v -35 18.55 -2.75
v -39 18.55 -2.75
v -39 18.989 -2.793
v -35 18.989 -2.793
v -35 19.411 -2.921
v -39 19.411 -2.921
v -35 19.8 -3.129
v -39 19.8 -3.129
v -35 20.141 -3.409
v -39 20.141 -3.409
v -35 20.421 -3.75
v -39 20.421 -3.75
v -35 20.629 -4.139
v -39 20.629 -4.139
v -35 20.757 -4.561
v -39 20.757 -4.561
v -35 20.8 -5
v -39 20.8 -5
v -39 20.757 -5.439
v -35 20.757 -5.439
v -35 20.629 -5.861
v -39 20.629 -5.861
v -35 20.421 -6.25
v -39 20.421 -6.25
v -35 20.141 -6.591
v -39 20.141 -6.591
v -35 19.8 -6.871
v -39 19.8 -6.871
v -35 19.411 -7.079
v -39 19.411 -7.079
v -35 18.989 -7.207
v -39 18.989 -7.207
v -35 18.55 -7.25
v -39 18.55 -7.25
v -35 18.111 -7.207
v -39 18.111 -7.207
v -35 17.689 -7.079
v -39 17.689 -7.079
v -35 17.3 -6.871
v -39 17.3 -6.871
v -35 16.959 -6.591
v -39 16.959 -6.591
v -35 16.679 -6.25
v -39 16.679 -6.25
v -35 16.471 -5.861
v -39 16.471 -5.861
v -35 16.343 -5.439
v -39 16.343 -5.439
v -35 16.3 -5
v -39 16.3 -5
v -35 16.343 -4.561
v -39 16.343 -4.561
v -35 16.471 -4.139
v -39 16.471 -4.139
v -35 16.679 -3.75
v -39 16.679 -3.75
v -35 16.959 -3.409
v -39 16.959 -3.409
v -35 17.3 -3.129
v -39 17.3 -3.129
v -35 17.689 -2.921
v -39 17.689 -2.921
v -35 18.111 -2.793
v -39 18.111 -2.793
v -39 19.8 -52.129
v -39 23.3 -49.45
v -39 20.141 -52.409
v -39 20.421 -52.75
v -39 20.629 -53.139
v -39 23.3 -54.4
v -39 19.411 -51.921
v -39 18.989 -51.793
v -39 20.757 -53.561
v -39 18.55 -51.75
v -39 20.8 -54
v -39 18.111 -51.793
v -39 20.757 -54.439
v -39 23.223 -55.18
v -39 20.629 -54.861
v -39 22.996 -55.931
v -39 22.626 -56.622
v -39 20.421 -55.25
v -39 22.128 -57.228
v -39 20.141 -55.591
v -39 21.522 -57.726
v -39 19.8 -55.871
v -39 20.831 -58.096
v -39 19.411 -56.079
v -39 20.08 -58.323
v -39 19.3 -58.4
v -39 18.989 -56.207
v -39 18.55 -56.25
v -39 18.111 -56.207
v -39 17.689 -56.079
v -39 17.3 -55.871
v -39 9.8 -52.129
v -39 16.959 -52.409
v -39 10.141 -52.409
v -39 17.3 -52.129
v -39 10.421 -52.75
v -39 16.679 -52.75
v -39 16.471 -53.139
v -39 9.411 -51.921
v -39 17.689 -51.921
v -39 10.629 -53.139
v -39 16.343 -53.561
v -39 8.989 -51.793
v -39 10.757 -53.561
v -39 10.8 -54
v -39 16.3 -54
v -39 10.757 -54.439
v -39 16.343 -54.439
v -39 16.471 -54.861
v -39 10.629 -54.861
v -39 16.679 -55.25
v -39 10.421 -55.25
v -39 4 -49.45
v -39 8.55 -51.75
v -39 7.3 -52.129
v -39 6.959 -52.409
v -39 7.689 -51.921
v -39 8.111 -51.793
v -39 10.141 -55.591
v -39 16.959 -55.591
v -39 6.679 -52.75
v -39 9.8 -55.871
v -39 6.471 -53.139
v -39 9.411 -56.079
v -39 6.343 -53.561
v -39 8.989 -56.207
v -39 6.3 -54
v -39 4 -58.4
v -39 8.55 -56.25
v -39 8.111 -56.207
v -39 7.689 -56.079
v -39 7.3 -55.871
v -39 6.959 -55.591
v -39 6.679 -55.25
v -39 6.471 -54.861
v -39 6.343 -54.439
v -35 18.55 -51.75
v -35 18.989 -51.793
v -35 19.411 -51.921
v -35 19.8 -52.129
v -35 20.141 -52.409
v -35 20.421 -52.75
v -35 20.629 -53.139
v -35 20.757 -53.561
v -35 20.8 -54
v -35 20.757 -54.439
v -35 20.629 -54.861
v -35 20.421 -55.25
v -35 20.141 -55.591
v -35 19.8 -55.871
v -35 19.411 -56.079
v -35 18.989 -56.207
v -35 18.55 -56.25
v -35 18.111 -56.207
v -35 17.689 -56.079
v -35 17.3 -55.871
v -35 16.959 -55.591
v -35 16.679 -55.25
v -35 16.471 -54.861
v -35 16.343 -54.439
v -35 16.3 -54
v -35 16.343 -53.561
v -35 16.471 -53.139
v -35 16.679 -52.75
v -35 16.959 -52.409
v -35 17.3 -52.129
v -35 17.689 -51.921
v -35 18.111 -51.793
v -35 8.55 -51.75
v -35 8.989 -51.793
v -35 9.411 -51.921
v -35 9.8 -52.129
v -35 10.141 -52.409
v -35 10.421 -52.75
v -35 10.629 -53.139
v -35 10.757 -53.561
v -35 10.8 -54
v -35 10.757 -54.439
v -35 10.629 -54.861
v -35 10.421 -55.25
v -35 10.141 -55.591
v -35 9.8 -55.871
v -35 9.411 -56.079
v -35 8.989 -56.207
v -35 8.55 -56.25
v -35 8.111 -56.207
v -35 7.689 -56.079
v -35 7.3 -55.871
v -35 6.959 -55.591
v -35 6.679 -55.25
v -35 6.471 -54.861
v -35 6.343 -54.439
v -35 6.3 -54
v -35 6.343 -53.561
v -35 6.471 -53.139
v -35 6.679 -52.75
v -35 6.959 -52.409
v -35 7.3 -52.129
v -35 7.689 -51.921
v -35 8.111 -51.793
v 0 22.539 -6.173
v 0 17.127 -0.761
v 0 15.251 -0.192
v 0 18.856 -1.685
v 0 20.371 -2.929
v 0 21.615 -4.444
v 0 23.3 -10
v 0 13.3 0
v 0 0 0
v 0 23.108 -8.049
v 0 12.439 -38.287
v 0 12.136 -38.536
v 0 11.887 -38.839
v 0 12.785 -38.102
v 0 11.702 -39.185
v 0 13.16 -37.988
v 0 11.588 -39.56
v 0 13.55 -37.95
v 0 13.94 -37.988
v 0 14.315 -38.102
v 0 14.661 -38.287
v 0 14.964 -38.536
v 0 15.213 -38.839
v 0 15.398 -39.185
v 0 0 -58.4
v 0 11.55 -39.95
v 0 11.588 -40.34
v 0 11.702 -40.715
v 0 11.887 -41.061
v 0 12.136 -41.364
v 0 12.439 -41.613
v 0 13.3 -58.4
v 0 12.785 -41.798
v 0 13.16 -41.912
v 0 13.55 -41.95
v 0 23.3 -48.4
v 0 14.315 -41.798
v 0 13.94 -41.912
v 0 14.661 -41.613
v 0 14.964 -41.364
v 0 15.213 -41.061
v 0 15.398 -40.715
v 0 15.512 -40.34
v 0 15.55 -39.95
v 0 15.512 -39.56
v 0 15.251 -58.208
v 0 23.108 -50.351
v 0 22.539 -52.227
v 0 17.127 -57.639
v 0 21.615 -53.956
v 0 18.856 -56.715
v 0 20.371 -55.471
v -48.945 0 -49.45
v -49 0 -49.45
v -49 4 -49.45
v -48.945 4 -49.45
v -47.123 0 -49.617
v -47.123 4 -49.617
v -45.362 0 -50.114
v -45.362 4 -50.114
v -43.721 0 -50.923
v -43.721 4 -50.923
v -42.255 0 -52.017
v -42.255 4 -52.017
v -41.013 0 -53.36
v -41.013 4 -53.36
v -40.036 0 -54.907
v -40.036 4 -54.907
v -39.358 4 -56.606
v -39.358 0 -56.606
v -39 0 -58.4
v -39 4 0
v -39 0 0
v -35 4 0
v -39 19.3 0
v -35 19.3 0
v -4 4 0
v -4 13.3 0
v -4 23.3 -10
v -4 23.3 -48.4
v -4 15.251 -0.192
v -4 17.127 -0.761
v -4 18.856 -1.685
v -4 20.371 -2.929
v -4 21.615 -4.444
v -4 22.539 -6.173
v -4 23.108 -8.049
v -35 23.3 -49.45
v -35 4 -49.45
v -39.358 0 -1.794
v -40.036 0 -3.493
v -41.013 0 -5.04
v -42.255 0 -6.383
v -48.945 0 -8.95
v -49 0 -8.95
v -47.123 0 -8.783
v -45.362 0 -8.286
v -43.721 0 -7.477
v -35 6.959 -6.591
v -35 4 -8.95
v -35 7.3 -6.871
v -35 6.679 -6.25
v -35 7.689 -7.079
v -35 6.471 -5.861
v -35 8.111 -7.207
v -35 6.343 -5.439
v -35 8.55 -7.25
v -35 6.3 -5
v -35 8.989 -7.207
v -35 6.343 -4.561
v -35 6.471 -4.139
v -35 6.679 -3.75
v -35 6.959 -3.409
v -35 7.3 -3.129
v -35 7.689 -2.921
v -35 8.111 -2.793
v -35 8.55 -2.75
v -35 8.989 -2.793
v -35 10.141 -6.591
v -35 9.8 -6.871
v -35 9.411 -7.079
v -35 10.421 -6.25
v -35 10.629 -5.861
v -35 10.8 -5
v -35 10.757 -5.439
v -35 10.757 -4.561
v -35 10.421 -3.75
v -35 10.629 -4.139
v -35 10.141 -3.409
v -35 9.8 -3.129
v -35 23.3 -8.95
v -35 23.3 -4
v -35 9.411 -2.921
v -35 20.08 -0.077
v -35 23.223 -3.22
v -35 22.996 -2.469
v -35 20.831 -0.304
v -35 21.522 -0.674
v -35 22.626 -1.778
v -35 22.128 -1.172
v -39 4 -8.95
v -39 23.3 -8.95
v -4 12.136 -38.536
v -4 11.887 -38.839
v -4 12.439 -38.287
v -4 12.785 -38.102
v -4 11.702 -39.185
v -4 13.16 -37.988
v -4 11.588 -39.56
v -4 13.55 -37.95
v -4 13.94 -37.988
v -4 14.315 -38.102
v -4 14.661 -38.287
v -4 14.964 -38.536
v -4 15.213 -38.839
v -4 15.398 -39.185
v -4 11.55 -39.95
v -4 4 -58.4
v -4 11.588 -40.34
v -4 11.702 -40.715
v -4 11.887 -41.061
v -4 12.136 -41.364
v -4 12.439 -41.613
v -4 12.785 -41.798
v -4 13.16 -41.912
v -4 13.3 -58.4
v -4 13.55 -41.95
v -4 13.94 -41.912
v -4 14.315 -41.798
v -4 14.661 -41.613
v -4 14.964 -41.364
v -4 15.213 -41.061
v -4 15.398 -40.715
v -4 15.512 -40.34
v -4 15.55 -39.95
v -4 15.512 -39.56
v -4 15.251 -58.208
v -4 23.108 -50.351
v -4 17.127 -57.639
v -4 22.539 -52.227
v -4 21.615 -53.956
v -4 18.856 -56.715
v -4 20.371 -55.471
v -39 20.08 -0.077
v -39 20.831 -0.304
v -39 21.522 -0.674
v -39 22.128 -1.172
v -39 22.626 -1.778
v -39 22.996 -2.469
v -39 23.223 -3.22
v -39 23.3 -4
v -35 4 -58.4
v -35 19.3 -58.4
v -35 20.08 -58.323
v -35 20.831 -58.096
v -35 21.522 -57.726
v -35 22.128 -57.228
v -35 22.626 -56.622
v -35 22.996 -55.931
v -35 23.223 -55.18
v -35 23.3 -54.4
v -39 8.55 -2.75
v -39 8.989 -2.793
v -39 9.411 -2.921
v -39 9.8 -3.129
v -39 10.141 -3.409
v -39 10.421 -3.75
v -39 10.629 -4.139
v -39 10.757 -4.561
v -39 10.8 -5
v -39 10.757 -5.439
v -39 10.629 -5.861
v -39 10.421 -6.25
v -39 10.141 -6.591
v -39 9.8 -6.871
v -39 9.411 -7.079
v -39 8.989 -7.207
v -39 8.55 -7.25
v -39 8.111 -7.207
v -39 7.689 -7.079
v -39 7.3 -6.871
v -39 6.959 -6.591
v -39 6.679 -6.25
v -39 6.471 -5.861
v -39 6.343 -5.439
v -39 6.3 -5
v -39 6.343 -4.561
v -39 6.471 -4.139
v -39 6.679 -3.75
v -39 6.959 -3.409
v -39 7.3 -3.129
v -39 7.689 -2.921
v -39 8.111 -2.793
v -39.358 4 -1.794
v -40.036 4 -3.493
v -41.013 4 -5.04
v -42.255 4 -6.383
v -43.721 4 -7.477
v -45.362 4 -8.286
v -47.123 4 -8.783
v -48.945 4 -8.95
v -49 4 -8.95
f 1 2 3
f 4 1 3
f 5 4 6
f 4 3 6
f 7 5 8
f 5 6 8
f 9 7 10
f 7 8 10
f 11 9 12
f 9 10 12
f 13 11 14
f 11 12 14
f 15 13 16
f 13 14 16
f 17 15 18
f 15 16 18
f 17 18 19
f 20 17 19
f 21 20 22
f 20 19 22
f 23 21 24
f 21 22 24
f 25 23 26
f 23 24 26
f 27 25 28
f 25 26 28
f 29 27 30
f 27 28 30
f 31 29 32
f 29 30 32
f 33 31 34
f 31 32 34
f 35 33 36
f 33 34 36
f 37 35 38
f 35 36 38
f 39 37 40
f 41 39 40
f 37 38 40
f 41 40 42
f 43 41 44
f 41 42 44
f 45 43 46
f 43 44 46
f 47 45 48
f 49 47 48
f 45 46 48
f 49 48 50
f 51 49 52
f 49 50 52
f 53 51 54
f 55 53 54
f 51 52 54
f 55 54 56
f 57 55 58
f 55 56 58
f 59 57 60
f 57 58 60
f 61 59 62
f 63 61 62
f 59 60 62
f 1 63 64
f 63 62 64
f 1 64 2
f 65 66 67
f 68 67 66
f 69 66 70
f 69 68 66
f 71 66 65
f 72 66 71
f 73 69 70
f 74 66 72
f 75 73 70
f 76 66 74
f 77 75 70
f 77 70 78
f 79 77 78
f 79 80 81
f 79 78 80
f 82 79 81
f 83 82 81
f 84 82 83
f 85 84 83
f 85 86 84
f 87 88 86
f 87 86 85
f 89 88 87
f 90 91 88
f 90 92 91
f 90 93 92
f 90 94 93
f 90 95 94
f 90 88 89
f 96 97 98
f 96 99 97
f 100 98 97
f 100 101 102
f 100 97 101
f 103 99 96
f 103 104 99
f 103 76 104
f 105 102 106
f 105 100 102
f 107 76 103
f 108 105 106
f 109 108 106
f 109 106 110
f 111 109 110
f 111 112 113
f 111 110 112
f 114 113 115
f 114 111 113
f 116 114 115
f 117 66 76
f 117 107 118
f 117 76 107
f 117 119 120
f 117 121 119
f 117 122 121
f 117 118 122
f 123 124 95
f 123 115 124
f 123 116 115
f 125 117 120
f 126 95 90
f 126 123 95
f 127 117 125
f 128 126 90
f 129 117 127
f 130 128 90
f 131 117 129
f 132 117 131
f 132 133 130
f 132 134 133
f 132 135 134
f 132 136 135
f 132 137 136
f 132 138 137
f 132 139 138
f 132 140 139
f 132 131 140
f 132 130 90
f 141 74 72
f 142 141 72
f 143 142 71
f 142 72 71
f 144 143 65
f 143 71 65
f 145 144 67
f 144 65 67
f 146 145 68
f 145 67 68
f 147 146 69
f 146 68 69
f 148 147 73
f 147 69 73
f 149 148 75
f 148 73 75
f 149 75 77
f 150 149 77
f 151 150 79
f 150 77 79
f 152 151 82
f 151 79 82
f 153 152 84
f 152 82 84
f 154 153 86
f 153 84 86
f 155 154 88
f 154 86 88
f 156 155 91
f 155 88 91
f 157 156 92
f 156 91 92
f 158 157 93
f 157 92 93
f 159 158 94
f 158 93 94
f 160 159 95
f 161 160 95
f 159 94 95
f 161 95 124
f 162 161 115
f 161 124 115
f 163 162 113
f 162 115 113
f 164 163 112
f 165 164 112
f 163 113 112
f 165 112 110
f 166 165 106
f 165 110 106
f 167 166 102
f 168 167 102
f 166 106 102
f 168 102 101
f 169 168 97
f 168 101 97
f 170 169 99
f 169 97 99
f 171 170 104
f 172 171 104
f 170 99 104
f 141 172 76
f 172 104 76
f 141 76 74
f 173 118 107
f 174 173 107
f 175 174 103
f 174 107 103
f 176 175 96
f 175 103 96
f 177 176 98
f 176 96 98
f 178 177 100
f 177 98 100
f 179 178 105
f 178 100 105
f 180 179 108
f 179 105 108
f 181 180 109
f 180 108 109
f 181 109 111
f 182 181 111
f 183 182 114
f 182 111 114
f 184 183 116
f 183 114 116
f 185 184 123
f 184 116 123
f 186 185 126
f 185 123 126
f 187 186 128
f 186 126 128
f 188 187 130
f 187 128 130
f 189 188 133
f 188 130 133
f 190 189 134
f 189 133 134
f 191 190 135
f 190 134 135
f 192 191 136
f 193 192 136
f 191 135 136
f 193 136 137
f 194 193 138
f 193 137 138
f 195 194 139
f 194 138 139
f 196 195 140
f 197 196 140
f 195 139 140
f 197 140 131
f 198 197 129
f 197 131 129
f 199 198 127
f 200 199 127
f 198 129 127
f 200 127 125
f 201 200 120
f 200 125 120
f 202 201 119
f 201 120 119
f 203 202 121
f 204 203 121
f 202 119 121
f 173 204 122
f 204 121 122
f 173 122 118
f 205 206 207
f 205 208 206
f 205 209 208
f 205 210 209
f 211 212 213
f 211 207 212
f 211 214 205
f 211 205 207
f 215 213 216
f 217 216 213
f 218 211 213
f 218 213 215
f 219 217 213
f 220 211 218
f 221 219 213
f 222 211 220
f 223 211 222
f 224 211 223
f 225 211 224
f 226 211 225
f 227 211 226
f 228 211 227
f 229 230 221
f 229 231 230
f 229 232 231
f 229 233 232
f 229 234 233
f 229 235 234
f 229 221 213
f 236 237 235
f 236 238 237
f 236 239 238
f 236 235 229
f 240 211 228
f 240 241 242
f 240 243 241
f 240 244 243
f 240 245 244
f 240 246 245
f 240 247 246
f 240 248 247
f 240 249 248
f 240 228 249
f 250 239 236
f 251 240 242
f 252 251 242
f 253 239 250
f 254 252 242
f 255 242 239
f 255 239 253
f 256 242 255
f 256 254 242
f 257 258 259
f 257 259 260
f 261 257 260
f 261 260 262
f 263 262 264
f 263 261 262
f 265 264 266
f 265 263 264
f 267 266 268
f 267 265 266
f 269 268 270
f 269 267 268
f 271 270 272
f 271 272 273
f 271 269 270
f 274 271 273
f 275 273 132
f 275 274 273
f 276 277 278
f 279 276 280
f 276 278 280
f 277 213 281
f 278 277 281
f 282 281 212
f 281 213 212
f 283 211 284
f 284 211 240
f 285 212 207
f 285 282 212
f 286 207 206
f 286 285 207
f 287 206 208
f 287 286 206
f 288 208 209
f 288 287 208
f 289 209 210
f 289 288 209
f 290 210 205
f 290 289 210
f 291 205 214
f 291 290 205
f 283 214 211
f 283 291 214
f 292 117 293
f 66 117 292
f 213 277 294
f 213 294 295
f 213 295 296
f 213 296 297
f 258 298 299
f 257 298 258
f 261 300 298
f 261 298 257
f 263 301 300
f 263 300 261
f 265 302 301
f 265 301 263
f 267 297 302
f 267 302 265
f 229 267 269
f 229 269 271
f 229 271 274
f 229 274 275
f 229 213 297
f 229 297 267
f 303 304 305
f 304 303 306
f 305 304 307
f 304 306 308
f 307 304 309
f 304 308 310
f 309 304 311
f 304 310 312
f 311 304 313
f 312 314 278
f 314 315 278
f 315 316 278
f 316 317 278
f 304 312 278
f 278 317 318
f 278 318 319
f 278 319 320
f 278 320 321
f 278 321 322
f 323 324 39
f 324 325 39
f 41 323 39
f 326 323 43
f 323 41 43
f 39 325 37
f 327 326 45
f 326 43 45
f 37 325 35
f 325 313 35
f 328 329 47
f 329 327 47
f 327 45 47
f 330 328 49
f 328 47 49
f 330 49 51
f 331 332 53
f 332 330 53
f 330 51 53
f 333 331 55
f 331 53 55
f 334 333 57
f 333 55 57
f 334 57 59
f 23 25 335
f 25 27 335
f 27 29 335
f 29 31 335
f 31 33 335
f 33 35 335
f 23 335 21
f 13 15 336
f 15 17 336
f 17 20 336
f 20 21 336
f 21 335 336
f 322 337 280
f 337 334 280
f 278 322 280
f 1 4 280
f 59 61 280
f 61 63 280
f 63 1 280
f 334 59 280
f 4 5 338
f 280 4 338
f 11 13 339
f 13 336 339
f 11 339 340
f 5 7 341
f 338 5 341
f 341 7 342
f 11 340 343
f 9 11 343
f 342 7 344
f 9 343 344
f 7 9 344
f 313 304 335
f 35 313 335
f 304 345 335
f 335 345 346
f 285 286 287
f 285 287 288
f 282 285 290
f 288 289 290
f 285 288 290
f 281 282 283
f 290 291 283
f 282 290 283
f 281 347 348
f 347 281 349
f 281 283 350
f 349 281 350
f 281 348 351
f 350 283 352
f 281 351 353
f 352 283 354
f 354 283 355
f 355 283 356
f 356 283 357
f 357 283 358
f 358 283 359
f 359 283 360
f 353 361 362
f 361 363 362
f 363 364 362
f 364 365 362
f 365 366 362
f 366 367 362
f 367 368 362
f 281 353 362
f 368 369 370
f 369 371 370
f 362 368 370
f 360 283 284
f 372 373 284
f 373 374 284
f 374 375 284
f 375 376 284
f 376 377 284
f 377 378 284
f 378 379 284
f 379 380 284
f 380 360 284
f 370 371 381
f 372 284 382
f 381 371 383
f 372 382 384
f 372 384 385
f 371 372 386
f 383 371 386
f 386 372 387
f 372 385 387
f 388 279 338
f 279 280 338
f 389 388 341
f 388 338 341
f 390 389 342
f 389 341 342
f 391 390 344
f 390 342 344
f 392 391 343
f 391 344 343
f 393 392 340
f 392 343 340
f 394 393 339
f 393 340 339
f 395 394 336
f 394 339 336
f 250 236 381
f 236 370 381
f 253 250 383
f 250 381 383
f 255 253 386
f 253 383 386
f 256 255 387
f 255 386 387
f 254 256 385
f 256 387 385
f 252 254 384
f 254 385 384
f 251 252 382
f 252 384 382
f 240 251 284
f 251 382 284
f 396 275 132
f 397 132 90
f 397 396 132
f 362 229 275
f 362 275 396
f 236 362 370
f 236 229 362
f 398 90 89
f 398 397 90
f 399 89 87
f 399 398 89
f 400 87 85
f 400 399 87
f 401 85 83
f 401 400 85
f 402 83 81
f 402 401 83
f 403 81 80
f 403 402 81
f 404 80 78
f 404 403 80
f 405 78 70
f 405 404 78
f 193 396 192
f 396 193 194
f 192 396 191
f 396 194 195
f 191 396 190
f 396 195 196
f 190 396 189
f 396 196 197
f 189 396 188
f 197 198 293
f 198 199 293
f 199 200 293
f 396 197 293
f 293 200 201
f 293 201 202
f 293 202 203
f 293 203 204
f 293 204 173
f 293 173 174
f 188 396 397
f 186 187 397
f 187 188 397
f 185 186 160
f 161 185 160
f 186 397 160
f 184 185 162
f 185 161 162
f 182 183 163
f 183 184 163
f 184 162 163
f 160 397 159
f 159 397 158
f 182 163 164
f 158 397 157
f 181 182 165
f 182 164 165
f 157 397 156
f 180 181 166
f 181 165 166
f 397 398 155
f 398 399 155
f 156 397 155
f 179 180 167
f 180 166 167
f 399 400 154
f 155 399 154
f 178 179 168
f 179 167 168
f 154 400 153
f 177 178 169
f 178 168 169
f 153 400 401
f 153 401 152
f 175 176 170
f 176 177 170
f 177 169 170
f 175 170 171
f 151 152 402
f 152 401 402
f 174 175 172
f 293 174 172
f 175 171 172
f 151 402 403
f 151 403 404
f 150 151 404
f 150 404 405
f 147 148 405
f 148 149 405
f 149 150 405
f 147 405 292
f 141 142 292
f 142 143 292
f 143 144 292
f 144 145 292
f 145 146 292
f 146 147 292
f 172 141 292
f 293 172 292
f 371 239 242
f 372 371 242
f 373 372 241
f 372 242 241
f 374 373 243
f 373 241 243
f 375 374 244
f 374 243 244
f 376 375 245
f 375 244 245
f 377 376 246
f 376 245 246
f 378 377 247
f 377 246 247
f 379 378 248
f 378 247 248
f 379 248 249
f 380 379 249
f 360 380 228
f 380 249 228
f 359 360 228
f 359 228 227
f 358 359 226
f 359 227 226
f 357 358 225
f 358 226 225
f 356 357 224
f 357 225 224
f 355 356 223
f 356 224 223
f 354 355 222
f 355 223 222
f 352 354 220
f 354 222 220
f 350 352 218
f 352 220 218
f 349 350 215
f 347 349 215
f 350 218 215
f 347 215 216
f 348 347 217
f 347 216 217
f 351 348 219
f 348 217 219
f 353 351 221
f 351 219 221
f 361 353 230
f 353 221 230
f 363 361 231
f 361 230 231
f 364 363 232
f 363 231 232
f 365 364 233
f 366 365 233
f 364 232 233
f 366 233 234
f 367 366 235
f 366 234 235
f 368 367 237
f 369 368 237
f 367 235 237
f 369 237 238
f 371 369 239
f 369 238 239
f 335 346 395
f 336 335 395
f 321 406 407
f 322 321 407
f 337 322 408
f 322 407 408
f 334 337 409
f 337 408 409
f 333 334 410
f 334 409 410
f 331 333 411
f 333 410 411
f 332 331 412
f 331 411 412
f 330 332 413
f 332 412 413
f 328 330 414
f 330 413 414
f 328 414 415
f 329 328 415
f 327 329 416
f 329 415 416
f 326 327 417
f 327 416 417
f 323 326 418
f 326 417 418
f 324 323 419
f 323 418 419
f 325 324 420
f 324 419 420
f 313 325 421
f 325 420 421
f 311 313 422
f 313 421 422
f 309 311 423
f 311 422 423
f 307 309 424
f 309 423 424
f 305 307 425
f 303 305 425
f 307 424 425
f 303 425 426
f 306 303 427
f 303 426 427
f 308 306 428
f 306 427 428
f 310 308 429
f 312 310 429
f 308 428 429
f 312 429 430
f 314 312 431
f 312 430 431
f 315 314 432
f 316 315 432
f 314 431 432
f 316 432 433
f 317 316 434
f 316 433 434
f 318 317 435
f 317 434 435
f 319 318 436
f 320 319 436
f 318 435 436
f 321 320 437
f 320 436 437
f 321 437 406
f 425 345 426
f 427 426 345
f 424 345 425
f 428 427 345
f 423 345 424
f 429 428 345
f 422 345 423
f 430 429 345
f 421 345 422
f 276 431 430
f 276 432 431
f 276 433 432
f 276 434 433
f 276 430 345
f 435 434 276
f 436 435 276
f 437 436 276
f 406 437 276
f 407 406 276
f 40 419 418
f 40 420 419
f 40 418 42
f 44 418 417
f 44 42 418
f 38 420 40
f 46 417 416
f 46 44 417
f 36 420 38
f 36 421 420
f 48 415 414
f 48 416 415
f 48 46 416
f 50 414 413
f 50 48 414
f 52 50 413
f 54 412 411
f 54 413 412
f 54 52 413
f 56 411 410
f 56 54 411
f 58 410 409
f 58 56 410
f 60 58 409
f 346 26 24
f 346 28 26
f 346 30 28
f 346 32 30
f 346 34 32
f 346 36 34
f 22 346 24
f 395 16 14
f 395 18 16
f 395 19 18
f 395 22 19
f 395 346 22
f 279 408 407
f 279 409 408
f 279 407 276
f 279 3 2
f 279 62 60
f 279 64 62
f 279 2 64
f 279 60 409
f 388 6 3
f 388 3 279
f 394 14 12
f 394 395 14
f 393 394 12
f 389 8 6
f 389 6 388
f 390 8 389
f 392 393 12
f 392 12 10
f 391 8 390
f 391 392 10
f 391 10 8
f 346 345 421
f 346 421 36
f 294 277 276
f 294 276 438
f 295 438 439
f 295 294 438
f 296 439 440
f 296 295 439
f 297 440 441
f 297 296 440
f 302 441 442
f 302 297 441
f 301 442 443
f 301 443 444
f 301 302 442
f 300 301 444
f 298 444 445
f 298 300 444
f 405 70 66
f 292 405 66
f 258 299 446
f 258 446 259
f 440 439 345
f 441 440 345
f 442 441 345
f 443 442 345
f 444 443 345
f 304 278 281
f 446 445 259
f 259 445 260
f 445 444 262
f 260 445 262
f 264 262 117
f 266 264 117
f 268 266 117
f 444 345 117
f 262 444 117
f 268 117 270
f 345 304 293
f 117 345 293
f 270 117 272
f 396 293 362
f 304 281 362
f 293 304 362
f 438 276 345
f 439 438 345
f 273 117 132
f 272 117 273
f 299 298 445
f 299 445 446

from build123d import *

# Parameters (mm, degrees)
BOSS_EXTRUDE1_DEPTH = 4
SKETCH2_W           = 8.95
SKETCH2_H           = 19.3
SKETCH2_R           = 2.25
BOSS_EXTRUDE2_DEPTH = 4
FILLET1_R           = 10
FILLET2_R           = 4
SKETCH3_W           = 58.4
SKETCH3_H           = 19.3
SKETCH3_R           = 2
BOSS_EXTRUDE3_DEPTH = 4
FILLET3_R           = 10


with BuildPart() as part:
    # Sketch1 → Boss-Extrude1 (new body)
    with BuildSketch(Plane(origin=(0, 0, 0), x_dir=(1, 0, 0), z_dir=(0, 1, 0))):
        Polygon((-49, 49.45), (-39, 49.45), (-39, 58.4), (0, 58.4), (0, 0), (-39, 0), (-39, 8.95), (-49, 8.95), align=None)
    extrude(amount=BOSS_EXTRUDE1_DEPTH)

    # Sketch2 → Boss-Extrude2 (add)
    # profile 1 of 2: a face of its own
    with BuildSketch(Plane.ZY.offset(39)):
        with Locations((-4.475, 13.65)):
            Rectangle(SKETCH2_W, SKETCH2_H)
        with Locations((-5, 18.55)):
            Circle(SKETCH2_R, mode=Mode.SUBTRACT)
        with Locations((-5, 8.55)):
            Circle(SKETCH2_R, mode=Mode.SUBTRACT)
    # profile 2 of 2: a face of its own
    with BuildSketch(Plane.ZY.offset(39)):
        with Locations((-53.925, 13.65)):
            Rectangle(SKETCH2_W, SKETCH2_H)
        with Locations((-54, 18.55)):
            Circle(SKETCH2_R, mode=Mode.SUBTRACT)
        with Locations((-54, 8.55)):
            Circle(SKETCH2_R, mode=Mode.SUBTRACT)
    extrude(amount=-BOSS_EXTRUDE2_DEPTH)

    # Fillet1
    # the kernel refuses this fillet: 10 mm, written as the material it adds along each edge
    with BuildSketch(Plane(origin=(-39, 0, -49.45), x_dir=(-1, 0, 0), z_dir=(0, 1, 0))) as fillet1_piece_1:
        with BuildLine():
            CenterArc((9.944722218, -10), FILLET1_R, 90, 83.97283344)
            Line((0, -8.95), (0, 0))
            Line((0, 0), (9.944722218, 0))
        make_face()
    extrude(amount=4)
    with BuildSketch(Plane(origin=(-39, 0, -8.95), x_dir=(0, 0, 1), z_dir=(0, 1, 0))) as fillet1_piece_2:
        with BuildLine():
            CenterArc((10, -9.944722218), FILLET1_R, 96.02716656, 83.97283344)
            Line((0, -9.944722218), (0, 0))
            Line((0, 0), (8.95, 0))
        make_face()
    extrude(amount=4)

    # Fillet2
    fillet2_edges = [part.edges().sort_by_distance(p)[0] for p in [
        (-37, 23.3, 0),
        (-37, 23.3, -58.4),
    ]]
    fillet(fillet2_edges, radius=FILLET2_R)

    # Sketch3 → Boss-Extrude3 (add)
    with BuildSketch(Plane(origin=(0, 0, 0), x_dir=(0, 0, -1), z_dir=(1, 0, 0))):
        with Locations((29.2, 13.65)):
            Rectangle(SKETCH3_W, SKETCH3_H)
        with Locations((39.95, 13.55)):
            Circle(SKETCH3_R, mode=Mode.SUBTRACT)
    extrude(amount=-BOSS_EXTRUDE3_DEPTH)

    # Fillet3
    fillet3_edges = [part.edges().sort_by_distance(p)[0] for p in [
        (-2, 23.3, 0),
        (-2, 23.3, -58.4),
    ]]
    fillet(fillet3_edges, radius=FILLET3_R)


solid = part.part
